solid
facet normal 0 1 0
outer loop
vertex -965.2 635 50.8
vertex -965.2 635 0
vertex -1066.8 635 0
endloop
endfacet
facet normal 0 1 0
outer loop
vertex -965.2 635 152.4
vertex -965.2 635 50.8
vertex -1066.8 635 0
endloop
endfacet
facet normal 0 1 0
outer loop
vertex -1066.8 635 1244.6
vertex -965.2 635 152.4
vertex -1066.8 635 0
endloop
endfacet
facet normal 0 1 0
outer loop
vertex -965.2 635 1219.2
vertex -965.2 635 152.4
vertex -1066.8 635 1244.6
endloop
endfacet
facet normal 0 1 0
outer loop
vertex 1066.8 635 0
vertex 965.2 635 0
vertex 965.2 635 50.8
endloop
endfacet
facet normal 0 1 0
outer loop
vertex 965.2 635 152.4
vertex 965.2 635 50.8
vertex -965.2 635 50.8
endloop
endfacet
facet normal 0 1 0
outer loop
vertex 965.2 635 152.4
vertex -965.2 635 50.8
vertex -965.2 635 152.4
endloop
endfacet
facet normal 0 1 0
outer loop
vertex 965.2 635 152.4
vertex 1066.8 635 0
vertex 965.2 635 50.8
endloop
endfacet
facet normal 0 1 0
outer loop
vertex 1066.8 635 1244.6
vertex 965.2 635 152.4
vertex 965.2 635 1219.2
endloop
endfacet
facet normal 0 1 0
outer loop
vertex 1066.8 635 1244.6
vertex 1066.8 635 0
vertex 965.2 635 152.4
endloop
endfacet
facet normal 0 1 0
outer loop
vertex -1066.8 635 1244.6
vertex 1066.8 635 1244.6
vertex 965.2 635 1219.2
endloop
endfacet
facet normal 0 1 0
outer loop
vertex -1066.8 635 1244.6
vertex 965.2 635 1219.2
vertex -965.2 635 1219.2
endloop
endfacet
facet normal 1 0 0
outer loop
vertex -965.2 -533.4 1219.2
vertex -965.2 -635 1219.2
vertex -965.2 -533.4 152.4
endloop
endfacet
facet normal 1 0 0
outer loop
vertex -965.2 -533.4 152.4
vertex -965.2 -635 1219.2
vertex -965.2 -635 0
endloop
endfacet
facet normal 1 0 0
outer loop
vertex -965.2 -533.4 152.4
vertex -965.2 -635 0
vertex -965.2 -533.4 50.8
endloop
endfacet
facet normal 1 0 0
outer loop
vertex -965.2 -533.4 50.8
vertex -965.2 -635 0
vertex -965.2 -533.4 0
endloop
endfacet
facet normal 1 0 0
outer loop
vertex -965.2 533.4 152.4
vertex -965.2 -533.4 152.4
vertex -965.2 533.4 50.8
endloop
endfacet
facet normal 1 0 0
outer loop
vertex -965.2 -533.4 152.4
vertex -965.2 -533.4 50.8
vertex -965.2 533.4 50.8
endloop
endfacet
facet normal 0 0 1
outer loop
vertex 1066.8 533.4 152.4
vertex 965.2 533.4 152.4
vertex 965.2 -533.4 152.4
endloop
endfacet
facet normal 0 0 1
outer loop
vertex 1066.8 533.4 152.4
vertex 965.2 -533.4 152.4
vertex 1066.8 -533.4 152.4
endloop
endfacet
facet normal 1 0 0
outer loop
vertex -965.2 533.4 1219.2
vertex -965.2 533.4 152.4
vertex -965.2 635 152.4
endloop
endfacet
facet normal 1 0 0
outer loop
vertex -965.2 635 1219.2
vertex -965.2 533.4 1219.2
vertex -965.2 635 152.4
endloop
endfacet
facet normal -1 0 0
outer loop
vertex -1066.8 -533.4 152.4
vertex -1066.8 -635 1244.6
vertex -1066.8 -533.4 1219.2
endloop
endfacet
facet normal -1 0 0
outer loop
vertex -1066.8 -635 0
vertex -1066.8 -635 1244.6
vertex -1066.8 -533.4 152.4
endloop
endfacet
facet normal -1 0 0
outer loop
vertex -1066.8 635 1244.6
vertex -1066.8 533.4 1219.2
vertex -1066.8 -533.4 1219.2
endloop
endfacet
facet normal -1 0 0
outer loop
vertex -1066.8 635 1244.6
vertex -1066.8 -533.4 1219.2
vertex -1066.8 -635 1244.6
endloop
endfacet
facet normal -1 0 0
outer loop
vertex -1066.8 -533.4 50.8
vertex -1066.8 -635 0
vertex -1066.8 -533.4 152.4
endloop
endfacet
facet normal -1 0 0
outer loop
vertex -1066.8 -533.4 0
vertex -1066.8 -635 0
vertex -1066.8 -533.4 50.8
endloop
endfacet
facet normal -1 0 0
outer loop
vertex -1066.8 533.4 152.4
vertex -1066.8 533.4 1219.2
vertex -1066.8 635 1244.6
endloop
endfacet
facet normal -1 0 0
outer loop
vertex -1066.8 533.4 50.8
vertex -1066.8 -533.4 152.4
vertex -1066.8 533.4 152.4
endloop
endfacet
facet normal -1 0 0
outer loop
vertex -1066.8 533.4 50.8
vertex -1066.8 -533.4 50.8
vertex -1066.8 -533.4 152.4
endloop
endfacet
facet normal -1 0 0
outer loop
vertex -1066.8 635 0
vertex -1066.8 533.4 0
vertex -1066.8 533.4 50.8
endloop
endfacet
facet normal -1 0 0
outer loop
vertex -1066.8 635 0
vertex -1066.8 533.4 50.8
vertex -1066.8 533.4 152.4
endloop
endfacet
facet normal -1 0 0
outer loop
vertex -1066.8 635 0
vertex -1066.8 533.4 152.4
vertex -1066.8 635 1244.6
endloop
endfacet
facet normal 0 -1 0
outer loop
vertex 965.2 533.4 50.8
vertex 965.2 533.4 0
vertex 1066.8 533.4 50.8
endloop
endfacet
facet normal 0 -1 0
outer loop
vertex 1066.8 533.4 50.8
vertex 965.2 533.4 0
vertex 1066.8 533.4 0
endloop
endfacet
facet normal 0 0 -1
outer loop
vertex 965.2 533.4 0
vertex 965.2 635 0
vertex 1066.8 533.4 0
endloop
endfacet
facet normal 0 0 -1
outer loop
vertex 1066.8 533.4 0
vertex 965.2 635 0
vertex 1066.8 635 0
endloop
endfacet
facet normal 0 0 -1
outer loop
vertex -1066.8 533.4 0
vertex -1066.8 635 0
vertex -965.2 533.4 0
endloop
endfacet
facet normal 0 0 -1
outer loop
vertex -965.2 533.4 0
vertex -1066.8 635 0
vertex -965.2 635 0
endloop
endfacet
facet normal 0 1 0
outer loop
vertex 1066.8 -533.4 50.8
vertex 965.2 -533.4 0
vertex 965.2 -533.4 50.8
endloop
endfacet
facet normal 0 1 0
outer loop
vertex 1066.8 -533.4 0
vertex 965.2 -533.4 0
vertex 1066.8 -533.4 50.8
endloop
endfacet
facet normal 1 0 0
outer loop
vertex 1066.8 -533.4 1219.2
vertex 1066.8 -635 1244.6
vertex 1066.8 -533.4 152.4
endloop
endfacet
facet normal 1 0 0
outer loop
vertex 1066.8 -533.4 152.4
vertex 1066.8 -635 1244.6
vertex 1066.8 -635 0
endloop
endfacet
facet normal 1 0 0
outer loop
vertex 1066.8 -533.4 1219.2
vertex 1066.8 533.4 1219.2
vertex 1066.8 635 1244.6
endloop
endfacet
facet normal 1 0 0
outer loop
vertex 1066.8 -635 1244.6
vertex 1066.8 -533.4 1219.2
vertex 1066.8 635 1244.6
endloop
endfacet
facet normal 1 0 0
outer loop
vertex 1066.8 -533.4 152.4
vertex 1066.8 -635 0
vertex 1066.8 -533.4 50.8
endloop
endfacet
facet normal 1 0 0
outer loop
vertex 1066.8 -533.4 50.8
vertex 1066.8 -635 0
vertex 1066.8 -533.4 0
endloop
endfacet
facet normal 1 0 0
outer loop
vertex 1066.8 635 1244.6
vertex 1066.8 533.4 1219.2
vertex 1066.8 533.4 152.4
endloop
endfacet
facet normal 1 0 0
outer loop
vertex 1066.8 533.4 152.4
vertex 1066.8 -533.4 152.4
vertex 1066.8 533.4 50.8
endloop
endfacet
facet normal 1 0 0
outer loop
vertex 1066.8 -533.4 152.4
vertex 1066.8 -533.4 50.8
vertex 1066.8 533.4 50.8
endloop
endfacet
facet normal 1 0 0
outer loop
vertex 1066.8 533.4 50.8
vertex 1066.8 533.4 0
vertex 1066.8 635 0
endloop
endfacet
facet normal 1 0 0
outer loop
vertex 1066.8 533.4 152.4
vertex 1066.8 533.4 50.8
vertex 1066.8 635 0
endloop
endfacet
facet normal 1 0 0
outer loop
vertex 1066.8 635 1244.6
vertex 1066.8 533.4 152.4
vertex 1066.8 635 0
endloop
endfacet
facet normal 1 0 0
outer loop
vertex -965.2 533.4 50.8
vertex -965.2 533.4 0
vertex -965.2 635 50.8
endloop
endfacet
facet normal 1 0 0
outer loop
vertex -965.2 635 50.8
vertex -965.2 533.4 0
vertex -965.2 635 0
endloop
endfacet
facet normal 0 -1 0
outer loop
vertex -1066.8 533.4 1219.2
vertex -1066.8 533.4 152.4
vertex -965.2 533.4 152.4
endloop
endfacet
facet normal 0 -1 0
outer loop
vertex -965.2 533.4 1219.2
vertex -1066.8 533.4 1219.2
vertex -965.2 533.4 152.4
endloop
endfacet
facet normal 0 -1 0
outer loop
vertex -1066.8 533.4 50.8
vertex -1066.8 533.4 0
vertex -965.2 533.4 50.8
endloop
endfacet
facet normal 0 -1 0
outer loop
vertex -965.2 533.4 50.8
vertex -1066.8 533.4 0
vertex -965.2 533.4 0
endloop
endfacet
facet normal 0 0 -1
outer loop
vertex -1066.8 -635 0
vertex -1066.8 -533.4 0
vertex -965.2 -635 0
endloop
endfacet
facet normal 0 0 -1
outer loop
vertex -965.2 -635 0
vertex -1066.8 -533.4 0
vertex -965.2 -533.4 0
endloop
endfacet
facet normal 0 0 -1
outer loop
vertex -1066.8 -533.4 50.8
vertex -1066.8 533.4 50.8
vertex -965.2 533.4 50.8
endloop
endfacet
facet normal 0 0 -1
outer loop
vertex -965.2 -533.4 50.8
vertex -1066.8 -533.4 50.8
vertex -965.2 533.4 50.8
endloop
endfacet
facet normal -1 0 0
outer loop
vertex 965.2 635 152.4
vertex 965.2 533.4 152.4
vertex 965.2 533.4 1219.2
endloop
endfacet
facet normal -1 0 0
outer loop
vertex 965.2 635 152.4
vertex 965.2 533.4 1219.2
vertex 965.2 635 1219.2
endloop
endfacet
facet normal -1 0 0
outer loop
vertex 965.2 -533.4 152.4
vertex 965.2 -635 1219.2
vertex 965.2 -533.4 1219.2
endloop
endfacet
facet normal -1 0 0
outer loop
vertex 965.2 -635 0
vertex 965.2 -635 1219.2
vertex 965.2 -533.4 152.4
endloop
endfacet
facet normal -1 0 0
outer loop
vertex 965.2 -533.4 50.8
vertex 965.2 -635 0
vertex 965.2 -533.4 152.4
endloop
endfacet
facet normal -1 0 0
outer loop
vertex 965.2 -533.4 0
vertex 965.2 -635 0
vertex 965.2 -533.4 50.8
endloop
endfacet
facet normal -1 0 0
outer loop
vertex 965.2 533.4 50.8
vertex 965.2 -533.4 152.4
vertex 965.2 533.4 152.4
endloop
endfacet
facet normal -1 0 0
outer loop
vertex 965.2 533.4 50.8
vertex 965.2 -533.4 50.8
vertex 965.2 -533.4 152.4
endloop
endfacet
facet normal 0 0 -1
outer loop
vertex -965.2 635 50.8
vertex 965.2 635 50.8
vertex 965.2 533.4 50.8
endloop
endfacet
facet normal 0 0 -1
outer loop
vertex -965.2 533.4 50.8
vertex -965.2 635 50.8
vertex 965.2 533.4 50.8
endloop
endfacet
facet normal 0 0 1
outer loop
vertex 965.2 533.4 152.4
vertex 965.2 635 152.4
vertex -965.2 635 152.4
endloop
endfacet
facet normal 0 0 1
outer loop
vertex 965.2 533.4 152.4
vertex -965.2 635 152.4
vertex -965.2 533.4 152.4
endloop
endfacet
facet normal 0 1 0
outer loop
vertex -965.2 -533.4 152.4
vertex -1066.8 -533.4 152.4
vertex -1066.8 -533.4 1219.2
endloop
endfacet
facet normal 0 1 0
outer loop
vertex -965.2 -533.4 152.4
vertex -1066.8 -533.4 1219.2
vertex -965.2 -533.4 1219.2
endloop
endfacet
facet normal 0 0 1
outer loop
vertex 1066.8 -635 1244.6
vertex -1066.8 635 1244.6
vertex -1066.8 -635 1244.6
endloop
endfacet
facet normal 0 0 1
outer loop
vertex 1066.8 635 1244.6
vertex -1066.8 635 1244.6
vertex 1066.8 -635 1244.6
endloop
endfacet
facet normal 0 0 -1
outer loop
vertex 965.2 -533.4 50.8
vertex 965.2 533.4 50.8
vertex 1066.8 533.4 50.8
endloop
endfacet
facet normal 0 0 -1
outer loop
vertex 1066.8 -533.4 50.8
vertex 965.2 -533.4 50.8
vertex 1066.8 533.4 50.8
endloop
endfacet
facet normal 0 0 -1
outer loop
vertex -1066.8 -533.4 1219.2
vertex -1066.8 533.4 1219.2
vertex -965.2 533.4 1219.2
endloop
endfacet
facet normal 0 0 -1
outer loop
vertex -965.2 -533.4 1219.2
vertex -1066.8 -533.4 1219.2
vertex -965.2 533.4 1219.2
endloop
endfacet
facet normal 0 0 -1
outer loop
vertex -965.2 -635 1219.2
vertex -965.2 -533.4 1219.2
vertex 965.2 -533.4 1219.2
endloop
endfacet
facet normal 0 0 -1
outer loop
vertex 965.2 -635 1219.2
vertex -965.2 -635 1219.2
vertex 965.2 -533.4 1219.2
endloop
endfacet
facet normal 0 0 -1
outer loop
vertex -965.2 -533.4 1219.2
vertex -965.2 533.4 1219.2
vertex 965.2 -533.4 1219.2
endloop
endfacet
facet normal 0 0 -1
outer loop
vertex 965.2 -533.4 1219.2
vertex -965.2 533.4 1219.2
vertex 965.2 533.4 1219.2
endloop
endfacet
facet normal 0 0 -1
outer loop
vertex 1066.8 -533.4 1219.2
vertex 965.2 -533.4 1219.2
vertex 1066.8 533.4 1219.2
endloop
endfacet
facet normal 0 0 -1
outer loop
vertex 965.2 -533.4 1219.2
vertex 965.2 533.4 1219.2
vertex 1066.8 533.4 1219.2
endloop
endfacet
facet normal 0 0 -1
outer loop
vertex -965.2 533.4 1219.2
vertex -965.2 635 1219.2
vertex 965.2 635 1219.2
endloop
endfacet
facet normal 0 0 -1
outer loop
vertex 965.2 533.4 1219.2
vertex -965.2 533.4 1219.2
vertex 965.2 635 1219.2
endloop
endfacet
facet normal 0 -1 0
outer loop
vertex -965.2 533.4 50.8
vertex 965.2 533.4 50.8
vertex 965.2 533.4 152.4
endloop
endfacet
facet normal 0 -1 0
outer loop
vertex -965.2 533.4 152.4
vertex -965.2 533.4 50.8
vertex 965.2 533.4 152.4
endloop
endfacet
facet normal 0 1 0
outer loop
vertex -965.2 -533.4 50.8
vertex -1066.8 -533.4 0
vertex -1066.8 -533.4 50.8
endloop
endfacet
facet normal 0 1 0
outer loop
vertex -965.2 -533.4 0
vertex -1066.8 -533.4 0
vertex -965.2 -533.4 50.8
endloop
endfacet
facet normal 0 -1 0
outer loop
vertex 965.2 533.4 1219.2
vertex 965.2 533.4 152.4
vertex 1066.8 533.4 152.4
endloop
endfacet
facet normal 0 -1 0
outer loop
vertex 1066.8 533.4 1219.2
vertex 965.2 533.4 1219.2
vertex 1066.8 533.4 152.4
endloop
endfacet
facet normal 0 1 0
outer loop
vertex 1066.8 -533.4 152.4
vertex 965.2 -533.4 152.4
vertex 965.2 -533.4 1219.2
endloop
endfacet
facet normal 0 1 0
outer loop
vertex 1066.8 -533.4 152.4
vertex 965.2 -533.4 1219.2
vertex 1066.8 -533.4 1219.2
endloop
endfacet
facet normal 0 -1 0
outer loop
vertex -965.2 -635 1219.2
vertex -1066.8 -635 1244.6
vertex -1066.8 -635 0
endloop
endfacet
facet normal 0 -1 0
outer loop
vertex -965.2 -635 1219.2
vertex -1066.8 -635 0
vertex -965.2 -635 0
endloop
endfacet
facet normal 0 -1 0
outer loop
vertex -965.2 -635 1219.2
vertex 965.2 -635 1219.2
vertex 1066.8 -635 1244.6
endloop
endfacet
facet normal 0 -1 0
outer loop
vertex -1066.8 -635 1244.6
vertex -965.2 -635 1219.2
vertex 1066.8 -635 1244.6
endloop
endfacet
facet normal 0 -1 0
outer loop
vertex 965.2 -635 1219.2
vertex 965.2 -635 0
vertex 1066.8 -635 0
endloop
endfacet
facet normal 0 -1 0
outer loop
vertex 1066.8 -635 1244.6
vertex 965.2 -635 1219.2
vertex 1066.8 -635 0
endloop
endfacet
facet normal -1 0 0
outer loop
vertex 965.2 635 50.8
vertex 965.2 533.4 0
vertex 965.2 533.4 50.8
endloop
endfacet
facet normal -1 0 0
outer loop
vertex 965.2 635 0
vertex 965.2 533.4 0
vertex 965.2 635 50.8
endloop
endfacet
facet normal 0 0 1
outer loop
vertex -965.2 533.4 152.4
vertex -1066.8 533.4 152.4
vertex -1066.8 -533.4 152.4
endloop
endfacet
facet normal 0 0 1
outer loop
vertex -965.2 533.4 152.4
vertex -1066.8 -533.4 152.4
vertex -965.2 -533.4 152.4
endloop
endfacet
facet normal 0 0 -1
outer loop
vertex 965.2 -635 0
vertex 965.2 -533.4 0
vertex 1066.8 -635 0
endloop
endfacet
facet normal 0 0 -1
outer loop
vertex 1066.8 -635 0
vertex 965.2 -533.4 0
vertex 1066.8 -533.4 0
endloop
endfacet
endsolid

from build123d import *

# Parameters (mm, degrees)
F0_W     = 101.6
F0_H     = 101.6
F1_DEPTH = 1219.2
F2_W     = 2133.6
F2_H     = 1270
F3_DEPTH = 25.4
F4_W     = 101.6
F4_H     = 101.6
F5_DEPTH = 1066.8
F6_W     = 101.6
F6_H     = 101.6
F7_DEPTH = 1930.4


with BuildPart() as f1:
    # F0 (on Top) → F1 (new body)
    with BuildSketch(Plane.XY):
        with Locations((-1016, 584.2)):
            Rectangle(F0_W, F0_H)
        with Locations((-1016, -584.2)):
            Rectangle(F0_W, F0_H)
        with Locations((1016, -584.2)):
            Rectangle(F0_W, F0_H)
        with Locations((1016, 584.2)):
            Rectangle(F0_W, F0_H)
    extrude(amount=F1_DEPTH)

    # F2 (on face) → F3 (join)
    with BuildSketch(Plane.XY.offset(1219.2)):
        Rectangle(F2_W, F2_H)
    extrude(amount=F3_DEPTH)

    # F4 (on face) → F5 (join, through all)
    with BuildSketch(Plane.XZ.offset(-533.4)):
        with Locations((-1016, 101.6)):
            Rectangle(F4_W, F4_H)
        with Locations((1016, 101.6)):
            Rectangle(F4_W, F4_H)
    extrude(amount=F5_DEPTH)

    # F6 (on face) → F7 (join, through all)
    with BuildSketch(Plane(origin=(965.2, 0, 0), x_dir=(0, -1, 0), z_dir=(-1, 0, 0))):
        with Locations((-584.2, 101.6)):
            Rectangle(F6_W, F6_H)
    extrude(amount=F7_DEPTH)


solid = f1.part
